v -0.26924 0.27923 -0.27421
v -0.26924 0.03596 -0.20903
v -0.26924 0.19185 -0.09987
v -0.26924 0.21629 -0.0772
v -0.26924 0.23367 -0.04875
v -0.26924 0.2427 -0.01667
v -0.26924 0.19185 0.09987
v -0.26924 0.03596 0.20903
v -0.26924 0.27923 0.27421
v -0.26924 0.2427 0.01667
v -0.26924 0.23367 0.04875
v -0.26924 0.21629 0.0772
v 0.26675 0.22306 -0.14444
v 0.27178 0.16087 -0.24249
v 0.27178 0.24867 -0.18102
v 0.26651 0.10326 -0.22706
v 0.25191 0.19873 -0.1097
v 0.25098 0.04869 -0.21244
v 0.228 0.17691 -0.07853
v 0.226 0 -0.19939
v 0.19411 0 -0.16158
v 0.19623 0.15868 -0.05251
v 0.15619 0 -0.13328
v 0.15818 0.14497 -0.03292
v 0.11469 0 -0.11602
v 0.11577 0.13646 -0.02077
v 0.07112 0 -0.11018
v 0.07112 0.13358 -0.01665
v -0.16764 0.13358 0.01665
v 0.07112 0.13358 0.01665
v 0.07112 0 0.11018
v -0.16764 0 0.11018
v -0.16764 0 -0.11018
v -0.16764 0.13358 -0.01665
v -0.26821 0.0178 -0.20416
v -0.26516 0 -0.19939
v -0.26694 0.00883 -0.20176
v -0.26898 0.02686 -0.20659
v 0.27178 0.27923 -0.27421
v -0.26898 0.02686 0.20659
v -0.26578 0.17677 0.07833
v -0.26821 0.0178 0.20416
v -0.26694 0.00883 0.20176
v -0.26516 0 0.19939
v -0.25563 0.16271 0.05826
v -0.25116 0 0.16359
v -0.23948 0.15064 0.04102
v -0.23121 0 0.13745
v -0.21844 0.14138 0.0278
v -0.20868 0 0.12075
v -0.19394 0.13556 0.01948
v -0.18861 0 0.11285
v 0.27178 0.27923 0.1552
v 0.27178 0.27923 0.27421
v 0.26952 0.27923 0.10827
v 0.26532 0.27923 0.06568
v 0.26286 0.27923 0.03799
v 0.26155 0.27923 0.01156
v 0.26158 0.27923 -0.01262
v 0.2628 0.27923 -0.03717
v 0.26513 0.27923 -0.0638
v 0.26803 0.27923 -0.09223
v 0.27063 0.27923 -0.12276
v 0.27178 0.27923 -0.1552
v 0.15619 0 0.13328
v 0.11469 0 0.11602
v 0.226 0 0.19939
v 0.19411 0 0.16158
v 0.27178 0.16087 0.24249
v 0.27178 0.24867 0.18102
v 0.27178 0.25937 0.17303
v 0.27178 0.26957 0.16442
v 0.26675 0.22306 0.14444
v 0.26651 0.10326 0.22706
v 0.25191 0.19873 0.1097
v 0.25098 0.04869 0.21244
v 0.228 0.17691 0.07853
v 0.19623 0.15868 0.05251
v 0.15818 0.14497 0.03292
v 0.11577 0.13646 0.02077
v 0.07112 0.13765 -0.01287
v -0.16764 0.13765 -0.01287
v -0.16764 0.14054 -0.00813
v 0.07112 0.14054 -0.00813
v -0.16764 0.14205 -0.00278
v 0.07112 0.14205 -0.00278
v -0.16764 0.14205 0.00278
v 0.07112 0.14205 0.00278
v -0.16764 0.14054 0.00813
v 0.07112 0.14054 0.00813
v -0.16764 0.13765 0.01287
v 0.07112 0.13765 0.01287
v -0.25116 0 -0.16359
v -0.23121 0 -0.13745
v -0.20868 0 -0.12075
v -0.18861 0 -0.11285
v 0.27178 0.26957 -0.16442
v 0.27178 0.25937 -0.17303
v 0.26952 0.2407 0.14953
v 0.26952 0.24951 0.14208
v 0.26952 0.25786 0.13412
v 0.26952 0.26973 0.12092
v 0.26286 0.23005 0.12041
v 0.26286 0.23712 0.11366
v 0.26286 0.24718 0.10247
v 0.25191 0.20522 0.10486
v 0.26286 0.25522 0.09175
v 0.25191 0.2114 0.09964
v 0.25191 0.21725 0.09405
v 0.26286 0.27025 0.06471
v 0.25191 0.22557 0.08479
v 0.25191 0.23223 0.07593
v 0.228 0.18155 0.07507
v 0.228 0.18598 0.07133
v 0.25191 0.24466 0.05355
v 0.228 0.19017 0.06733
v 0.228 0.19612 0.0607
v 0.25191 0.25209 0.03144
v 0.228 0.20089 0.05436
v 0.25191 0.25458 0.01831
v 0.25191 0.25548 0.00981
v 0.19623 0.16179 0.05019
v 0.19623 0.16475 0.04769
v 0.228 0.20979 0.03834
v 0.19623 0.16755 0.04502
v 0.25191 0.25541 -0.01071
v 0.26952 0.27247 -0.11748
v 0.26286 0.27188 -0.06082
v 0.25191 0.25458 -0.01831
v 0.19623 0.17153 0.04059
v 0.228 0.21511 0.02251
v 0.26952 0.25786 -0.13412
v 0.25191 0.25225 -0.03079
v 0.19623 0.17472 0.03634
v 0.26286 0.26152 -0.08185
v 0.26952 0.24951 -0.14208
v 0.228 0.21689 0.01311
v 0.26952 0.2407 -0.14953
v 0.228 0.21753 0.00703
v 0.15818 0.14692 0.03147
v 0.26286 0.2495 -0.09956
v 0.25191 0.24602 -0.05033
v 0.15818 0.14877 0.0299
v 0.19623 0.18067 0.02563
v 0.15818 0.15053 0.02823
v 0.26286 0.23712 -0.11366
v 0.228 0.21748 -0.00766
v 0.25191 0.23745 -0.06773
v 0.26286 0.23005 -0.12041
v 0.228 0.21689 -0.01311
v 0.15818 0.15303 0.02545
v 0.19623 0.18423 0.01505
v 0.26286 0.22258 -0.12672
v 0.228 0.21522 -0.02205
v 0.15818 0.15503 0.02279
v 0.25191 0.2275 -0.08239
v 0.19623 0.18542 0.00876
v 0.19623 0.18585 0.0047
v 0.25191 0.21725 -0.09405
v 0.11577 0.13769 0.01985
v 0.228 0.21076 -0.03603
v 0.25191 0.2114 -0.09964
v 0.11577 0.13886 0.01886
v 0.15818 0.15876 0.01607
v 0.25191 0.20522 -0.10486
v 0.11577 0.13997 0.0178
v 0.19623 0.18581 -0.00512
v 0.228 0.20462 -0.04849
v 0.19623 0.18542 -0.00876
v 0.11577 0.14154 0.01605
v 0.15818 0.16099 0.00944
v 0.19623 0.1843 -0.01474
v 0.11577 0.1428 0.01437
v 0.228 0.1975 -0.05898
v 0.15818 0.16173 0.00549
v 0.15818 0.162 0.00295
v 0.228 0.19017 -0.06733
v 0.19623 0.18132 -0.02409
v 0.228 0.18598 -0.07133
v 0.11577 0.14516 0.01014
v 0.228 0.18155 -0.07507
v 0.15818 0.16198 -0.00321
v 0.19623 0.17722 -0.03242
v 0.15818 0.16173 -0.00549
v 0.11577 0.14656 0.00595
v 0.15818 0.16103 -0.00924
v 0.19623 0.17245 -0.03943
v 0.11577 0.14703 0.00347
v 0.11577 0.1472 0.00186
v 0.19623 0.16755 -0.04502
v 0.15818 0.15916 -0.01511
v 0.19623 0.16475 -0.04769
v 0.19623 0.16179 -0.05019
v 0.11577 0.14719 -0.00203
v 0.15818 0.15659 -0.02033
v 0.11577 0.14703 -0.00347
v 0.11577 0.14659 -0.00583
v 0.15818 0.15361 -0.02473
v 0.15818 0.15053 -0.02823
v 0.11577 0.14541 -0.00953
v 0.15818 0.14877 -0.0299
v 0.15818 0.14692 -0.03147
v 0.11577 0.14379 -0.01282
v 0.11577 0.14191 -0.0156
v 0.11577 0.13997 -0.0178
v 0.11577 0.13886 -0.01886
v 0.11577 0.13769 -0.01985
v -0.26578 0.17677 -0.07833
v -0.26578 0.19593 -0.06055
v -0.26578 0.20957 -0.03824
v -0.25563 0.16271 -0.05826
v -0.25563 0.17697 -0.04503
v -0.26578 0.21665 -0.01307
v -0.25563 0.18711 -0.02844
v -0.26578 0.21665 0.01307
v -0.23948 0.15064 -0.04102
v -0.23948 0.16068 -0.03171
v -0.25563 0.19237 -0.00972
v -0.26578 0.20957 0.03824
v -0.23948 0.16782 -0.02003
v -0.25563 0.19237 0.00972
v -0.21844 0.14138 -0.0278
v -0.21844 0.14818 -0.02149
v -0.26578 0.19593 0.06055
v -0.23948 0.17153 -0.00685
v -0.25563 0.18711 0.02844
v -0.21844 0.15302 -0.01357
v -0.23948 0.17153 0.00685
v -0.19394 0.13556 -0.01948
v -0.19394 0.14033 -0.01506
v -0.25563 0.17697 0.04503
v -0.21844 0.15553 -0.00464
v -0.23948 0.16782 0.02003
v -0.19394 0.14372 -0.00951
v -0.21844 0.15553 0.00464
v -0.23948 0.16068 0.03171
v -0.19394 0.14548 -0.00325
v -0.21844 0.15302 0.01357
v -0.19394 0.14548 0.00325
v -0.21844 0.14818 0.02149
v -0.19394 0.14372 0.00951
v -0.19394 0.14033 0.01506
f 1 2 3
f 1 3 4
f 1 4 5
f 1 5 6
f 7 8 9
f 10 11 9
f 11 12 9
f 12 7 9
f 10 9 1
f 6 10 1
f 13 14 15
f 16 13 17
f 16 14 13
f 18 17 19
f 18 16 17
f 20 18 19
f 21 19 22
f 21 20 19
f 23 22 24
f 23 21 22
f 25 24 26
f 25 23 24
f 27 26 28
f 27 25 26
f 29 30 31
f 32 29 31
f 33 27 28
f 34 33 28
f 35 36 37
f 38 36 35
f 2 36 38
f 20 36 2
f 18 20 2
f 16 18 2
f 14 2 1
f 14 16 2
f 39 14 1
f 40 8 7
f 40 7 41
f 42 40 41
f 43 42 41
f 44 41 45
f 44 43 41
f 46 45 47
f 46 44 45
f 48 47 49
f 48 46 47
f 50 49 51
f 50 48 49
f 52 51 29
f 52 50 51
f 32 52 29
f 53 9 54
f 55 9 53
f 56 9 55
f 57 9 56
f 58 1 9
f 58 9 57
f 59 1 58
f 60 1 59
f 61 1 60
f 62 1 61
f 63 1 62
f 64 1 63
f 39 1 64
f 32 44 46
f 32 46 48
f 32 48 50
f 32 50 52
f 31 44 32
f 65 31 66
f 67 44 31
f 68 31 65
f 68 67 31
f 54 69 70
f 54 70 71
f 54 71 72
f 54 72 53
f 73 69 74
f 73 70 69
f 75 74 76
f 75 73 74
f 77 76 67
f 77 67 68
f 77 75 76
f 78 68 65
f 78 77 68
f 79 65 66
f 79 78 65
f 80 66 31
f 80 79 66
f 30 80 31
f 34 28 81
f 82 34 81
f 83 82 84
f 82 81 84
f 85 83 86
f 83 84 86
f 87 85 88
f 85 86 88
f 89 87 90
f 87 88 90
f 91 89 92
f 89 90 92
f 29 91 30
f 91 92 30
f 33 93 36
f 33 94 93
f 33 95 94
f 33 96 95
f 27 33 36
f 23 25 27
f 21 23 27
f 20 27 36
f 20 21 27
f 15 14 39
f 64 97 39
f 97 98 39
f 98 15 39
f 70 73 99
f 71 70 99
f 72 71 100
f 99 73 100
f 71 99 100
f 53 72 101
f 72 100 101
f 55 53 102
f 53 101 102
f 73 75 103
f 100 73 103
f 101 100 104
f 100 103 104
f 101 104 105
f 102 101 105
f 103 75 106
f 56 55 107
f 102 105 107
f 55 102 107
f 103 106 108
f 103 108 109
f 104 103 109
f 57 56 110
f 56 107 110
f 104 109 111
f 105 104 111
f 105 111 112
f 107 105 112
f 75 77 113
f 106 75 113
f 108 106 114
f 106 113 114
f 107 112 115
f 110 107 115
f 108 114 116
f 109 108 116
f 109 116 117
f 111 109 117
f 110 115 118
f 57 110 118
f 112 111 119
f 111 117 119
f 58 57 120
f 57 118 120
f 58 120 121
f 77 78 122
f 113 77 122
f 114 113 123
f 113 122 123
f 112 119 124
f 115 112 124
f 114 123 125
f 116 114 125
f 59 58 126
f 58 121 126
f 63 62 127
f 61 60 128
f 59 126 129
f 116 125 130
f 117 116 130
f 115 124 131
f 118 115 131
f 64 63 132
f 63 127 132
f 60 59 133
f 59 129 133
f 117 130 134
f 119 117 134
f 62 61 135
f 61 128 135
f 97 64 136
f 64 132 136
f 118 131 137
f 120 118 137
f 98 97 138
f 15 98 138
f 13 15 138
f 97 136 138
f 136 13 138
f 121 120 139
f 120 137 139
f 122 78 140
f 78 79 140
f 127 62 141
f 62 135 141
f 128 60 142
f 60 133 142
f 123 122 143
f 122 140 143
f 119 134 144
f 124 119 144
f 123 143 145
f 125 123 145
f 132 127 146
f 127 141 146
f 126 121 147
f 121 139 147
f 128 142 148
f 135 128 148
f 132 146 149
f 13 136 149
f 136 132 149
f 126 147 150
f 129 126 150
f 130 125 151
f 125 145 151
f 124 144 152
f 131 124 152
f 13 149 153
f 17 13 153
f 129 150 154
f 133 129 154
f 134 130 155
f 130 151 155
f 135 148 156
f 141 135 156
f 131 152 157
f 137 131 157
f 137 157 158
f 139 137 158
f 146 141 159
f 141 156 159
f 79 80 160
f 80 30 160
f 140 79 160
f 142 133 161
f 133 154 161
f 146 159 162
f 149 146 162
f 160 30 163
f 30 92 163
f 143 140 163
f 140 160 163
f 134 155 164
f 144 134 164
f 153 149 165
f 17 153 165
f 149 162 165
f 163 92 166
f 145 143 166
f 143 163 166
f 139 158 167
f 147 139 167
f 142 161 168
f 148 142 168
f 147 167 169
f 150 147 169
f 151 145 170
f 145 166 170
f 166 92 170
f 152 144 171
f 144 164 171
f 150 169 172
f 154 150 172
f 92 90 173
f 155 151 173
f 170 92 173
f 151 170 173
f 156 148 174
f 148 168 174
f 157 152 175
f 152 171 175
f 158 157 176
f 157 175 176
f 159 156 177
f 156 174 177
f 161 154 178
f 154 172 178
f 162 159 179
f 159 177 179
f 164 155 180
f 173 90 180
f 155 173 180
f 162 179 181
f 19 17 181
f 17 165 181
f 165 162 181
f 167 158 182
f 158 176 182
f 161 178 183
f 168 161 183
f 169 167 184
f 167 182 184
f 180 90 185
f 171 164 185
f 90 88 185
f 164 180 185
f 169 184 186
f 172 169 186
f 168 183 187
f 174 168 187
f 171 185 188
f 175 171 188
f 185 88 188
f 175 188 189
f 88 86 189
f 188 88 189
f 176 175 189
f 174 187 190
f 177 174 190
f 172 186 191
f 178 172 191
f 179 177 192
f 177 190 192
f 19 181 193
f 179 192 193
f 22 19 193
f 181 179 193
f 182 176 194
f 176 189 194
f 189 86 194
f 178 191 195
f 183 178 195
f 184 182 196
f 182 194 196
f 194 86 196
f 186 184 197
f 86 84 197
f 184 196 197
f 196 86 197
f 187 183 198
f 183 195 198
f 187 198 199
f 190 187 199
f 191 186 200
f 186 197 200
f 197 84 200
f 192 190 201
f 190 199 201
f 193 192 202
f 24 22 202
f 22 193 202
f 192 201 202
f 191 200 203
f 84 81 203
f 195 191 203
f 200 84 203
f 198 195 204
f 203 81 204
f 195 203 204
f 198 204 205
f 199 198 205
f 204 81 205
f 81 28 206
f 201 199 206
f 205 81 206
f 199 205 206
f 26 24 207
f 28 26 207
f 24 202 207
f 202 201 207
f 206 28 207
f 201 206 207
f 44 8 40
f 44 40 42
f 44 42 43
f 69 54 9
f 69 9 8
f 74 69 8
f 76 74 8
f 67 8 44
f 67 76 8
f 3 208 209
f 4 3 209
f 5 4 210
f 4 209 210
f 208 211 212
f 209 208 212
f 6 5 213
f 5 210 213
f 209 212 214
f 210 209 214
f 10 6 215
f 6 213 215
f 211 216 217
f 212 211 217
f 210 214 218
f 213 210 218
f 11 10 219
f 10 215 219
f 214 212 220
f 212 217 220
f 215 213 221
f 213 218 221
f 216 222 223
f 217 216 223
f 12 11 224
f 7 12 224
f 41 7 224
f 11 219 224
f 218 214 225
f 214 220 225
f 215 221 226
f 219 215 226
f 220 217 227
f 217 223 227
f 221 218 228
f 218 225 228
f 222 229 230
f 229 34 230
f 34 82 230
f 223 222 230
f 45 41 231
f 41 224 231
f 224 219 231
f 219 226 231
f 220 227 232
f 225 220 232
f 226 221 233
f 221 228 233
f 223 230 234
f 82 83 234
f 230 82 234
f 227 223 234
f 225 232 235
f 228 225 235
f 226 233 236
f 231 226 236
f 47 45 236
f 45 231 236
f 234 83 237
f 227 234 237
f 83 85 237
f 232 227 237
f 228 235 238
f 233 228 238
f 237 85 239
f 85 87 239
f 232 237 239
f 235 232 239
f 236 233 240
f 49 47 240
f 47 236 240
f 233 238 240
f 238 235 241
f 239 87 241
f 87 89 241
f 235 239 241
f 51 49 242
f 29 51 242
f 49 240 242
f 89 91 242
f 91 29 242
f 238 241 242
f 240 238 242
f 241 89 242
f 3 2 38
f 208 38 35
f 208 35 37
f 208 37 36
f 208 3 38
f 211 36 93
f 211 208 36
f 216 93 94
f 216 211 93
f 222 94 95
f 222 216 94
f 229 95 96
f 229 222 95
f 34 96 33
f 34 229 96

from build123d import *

# Parameters (mm, degrees)
SKETCH_TL_CUTTING_R    = 1.4986
TL_CUTTING_DEPTH       = 75.9968
SKETCH_TDF_CUTTING_W   = 3.01719996
SKETCH_TDF_CUTTING_H   = 3.01719996
TDF_CUTTING_DEPTH      = 77.026345527
VW_VR_GRINDING_DEPTH   = 1.4986
VW_VR_GRINDING_2_DEPTH = 1.4986
ISA_GRINDING_DEPTH     = 1.4986
SKETCH_PRE_FRX_BRX_W   = 1.21682002
SKETCH_PRE_FRX_BRX_H   = 0.83312
SKETCH_PRE_FRX_BRX_W_2 = 1.24935996
PRE_FRX_BRX_DEPTH      = 1.4986
FA_BA_GRINDING_DEPTH   = 1.4986
FR_EDM_R               = 0.1016
BR_EDM_R               = 0.20066
SKETCH_ENGRAVING_W     = 0.033186299
SKETCH_ENGRAVING_H     = 1.128593452
SKETCH_ENGRAVING_H_2   = 1.128593453
ENGRAVING_DEPTH        = 0.005


with BuildPart() as part:
    # sketch_TL_cutting → TL_cutting (new body)
    with BuildSketch(Plane(origin=(0, 0, 0), x_dir=(1, 0, 0), z_dir=(0, 1, 0))):
        with Locations(Location((0, 0, 0), (0, 0, 270))):
            Circle(SKETCH_TL_CUTTING_R)
    extrude(amount=TL_CUTTING_DEPTH)

    # sketch_TDF_cutting → TDF_cutting (cut, through all)
    with BuildSketch(Plane(origin=(0, 0, 0), x_dir=(1, 0, 0), z_dir=(0, 1, 0))):
        with Locations((-2.71001998, 0)):
            Rectangle(SKETCH_TDF_CUTTING_W, SKETCH_TDF_CUTTING_H)
    extrude(amount=TDF_CUTTING_DEPTH, mode=Mode.SUBTRACT)


with BuildPart() as body_2:
    # sketch_VW_VR_grinding → VW_VR_grinding (new, symmetric)
    with BuildSketch(Plane(origin=(0, 0, 0), x_dir=(0, 0, -1), z_dir=(1, 0, 0))):
        with BuildLine():
            Line((-1.49360001, -0.00999998), (-1.49360001, 0.822008914))
            ThreePointArc((-1.49360001, 0.822008914), (-1.493648337, 0.823115792), (-1.493792952, 0.824214246))
            Line((-1.493792952, 0.824214246), (-1.51859996, 0.964901782))
            Line((-1.51859996, 0.964901782), (-1.50859998, -0.00999998))
            Line((-1.50859998, -0.00999998), (-1.49360001, -0.00999998))
        make_face()
    extrude(amount=VW_VR_GRINDING_DEPTH, both=True)


with BuildPart() as body_3:
    # sketch_VW_VR_grinding → VW_VR_grinding 2 (new, symmetric)
    with BuildSketch(Plane(origin=(0, 0, 0), x_dir=(0, 0, -1), z_dir=(1, 0, 0))):
        with BuildLine():
            Line((1.49360001, -0.00999998), (1.49360001, 0.822008914))
            ThreePointArc((1.49360001, 0.822008914), (1.493648337, 0.823115792), (1.493792952, 0.824214246))
            Line((1.493792952, 0.824214246), (1.51859996, 0.964901782))
            Line((1.51859996, 0.964901782), (1.50859998, -0.00999998))
            Line((1.50859998, -0.00999998), (1.49360001, -0.00999998))
        make_face()
    extrude(amount=VW_VR_GRINDING_2_DEPTH, both=True)


    add(body_2.part)  # ISA_grinding merges body 2
    # sketch_ISA_grinding → ISA_grinding (add, symmetric)
    with BuildSketch(Plane(origin=(0, 0, 0), x_dir=(0, 0, -1), z_dir=(1, 0, 0))):
        Polygon((-0.19939, 0), (0.19939, 0), (1.50859998, 4.886038163), (1.50859998, -0.02999994), (-1.50859998, -0.02999994), (-1.50859998, 4.886038163), align=None)
    extrude(amount=ISA_GRINDING_DEPTH, both=True)

    # sketch_pre_FRX_BRX → pre_FRX_BRX (add, symmetric)
    with BuildSketch(Plane.XY):
        with Locations((0.89018999, 0.40656002)):
            Rectangle(SKETCH_PRE_FRX_BRX_W, SKETCH_PRE_FRX_BRX_H)
        with Locations((-0.89391998, 0.40656002)):
            Rectangle(SKETCH_PRE_FRX_BRX_W_2, SKETCH_PRE_FRX_BRX_H)
    extrude(amount=PRE_FRX_BRX_DEPTH, both=True)

    # sketch_FA_BA_grinding → FA_BA_grinding (add, symmetric)
    with BuildSketch(Plane.XY):
        Polygon((0.27178, -0.00999998), (0.27178, 0.83312), (1.6256, 10.466049838), (1.6256, -0.00999998), align=None)
        Polygon((-0.26924, -0.00999998), (-0.26924, 0.83312), (-1.32842, 8.369577303), (-1.32842, -0.00999998), align=None)
    extrude(amount=FA_BA_GRINDING_DEPTH, both=True)


with BuildPart() as part_1:
    add(part.part)

    # B1_fix: cut body 3
    add(body_3.part, mode=Mode.SUBTRACT)

    # V-Groove_EDM: sweep along a path in sketch_contour_V-Groove
    with BuildLine(Plane.XY) as v_groove_edm_path:
        Line((-1.20142, 0.14224), (1.4986, 0.14224))
    # sketch_section_V-Groove → V-Groove_EDM (sweep, cut)
    with BuildSketch(Plane(origin=(-1.20142, 0, -1.2954), x_dir=(0, 0, -1), z_dir=(1, 0, 0))):
        with BuildLine():
            Line((-1.27875483, 0.133575073), (-1.178222496, -0.00999998))
            Line((-1.178222496, -0.00999998), (-1.412577504, -0.00999998))
            Line((-1.412577504, -0.00999998), (-1.31204517, 0.133575073))
            ThreePointArc((-1.31204517, 0.133575073), (-1.2954, 0.14224), (-1.27875483, 0.133575073))
        make_face()
    sweep(path=v_groove_edm_path.line, mode=Mode.SUBTRACT)

    # FR_EDM
    fr_edm_edges = [part_1.edges().sort_by_distance(p)[0] for p in [
        (-0.26924, 0.14224, 0),
        (-0.26924, 0.066787537, -0.063410306),
        (-0.26924, 0.066787537, 0.063410306),
    ]]
    fillet(fr_edm_edges, radius=FR_EDM_R)

    # BR_EDM
    br_edm_edges = [part_1.edges().sort_by_distance(p)[0] for p in [
        (0.27178, 0.066787537, 0.063410306),
        (0.27178, 0.14224, 0),
        (0.27178, 0.066787537, -0.063410306),
    ]]
    fillet(br_edm_edges, radius=BR_EDM_R)

    # sketch_Engraving → Engraving (cut)
    # profile 1 of 14: a face of its own
    with BuildSketch(Plane.ZY.offset(1.20142)):
        Polygon((0.531688452, 45.269846756), (0.531688452, 44.551415224), (0.030264207, 44.92787231), (0.030264207, 44.765052028), (-0.034552784, 44.633862437), (-0.102740259, 44.56723057), (-0.296154161, 44.503450651), (-0.425528876, 44.503450651), (-0.618942778, 44.56723057), (-0.749354564, 44.69842016), (-0.81235668, 44.891834063), (-0.81235668, 45.083433089), (-0.749354564, 45.276846991), (-0.682722697, 45.345293734), (-0.555940662, 45.408295849), (-0.541940192, 45.382887589), (-0.665351744, 45.320663277), (-0.724724108, 45.262846521), (-0.785133544, 45.080062605), (-0.785133544, 44.895463814), (-0.724724108, 44.712420631), (-0.604164504, 44.592638831), (-0.42112132, 44.531451591), (-0.299524645, 44.531451591), (-0.116740729, 44.592638831), (-0.059701777, 44.652270463), (0.001485463, 44.772052263), (0.001485463, 44.985429798), (0.502909708, 44.60923198), (0.502909708, 45.269846756), align=None)
    # profile 2 of 14: a face of its own
    with BuildSketch(Plane.ZY.offset(1.20142)):
        Polygon((-0.79576353, 43.729743189), (-0.79576353, 43.758521933), (0.483723879, 43.758521933), (0.316755309, 43.923157091), (0.254530997, 44.049939126), (0.278902186, 44.064976668), (0.341904302, 43.940528044), (0.531688452, 43.74996609), (0.531688452, 43.729743189), align=None)
    # profile 3 of 14: a face of its own
    with BuildSketch(Plane.ZY.offset(1.20142)):
        Polygon((-0.79576353, 42.579837909), (-0.79576353, 42.608616653), (0.483723879, 42.608616653), (0.316755309, 42.773251811), (0.254530997, 42.900033846), (0.278902186, 42.915071388), (0.341904302, 42.790622765), (0.531688452, 42.60006081), (0.531688452, 42.579837909), align=None)
    # profile 4 of 14: a face of its own
    with BuildSketch(Plane.ZY.offset(1.20142)):
        Polygon((-0.786170615, 41.055549687), (-0.79576353, 41.079920876), (-0.367193584, 41.245333838), (-0.367193584, 41.893763019), (-0.79576353, 42.059175981), (-0.786170615, 42.08354717), (0.531688452, 41.578752441), (0.531688452, 41.559566612), align=None)
        Polygon((-0.340748251, 41.255704557), (0.478538519, 41.569159527), (-0.340748251, 41.883133033), align=None, mode=Mode.SUBTRACT)
    # profile 5 of 14: a face of its own
    with BuildSketch(Plane.ZY.offset(1.20142)):
        with Locations((-0.231596438, 40.285083075)):
            Rectangle(SKETCH_ENGRAVING_W, SKETCH_ENGRAVING_H)
    # profile 6 of 14: a face of its own
    with BuildSketch(Plane.ZY.offset(1.20142)):
        Polygon((0.515095302, 38.490248732), (-0.79576353, 38.988821029), (-0.79576353, 39.018636845), (0.521058466, 39.518246214), (0.531688452, 39.493875025), (-0.756354799, 39.003858571), (0.525466021, 38.514619921), align=None)
    # profile 7 of 14: a face of its own
    with BuildSketch(Plane.ZY.offset(1.20142)):
        Polygon((-0.786170615, 38.108295165), (0.502909708, 37.49227448), (0.502909708, 38.347080961), (0.531688452, 38.347080961), (0.531688452, 37.44508771), (-0.79576353, 38.083664709), align=None)
    # profile 8 of 14: a face of its own
    with BuildSketch(Plane.ZY.offset(1.20142)):
        Polygon((-0.554125786, 36.366740389), (-0.749354564, 36.498189247), (-0.81235668, 36.693158757), (-0.81235668, 36.82279274), (-0.749354564, 37.01776225), (-0.554125786, 37.148174036), (-0.237559601, 37.211176152), (-0.044923503, 37.211176152), (0.271901951, 37.148174036), (0.466871461, 37.01776225), (0.531688452, 36.82279274), (0.531688452, 36.693158757), (0.466871461, 36.498189247), (0.271901951, 36.366740389), (-0.044923503, 36.304775345), (-0.237559601, 36.304775345), align=None)
        Polygon((-0.539347512, 36.395778401), (-0.22874449, 36.332776285), (-0.044923503, 36.332776285), (0.26567952, 36.395778401), (0.446907827, 36.515560201), (0.507057995, 36.696788509), (0.507057995, 36.818385184), (0.446907827, 36.999613492), (0.26567952, 37.120173096), (-0.044923503, 37.182397408), (-0.22874449, 37.182397408), (-0.539347512, 37.120173096), (-0.72057582, 36.999613492), (-0.780985256, 36.818385184), (-0.780985256, 36.696788509), (-0.72057582, 36.515560201), align=None, mode=Mode.SUBTRACT)
    # profile 9 of 14: a face of its own
    with BuildSketch(Plane.ZY.offset(1.20142)):
        with Locations((-0.231596438, 35.419971561)):
            Rectangle(SKETCH_ENGRAVING_W, SKETCH_ENGRAVING_H_2)
    # profile 10 of 14: a face of its own
    with BuildSketch(Plane.ZY.offset(1.20142)):
        Polygon((-0.541940192, 34.502759279), (-0.665351744, 34.440534968), (-0.724724108, 34.382718211), (-0.785133544, 34.199934296), (-0.785133544, 34.015335505), (-0.724724108, 33.832292321), (-0.604164504, 33.712510521), (-0.42112132, 33.651323281), (-0.299524645, 33.651323281), (-0.116740729, 33.712510521), (0.003041071, 33.832292321), (0.064487579, 34.015335505), (0.064487579, 34.199934296), (0.003041071, 34.382718211), (-0.086924913, 34.470350784), (0.531688452, 34.402941113), (0.531688452, 33.762289971), (0.502909708, 33.762289971), (0.502909708, 34.377532852), (-0.007329648, 34.434312537), (0.028449332, 34.396718682), (0.092488519, 34.203304779), (0.092488519, 34.011705753), (0.028449332, 33.818291851), (-0.102740259, 33.687102261), (-0.296154161, 33.623322341), (-0.425528876, 33.623322341), (-0.618942778, 33.687102261), (-0.749354564, 33.818291851), (-0.81235668, 34.011705753), (-0.81235668, 34.203304779), (-0.749354564, 34.396718682), (-0.682722697, 34.465165424), (-0.555940662, 34.52816754), align=None)
    # profile 11 of 14: a face of its own
    with BuildSketch(Plane.ZY.offset(1.20142)):
        Polygon((-0.554125786, 32.535382105), (-0.749354564, 32.666830964), (-0.81235668, 32.861800473), (-0.81235668, 32.991434456), (-0.749354564, 33.186403966), (-0.554125786, 33.316815753), (-0.237559601, 33.379817868), (-0.044923503, 33.379817868), (0.271901951, 33.316815753), (0.466871461, 33.186403966), (0.531688452, 32.991434456), (0.531688452, 32.861800473), (0.466871461, 32.666830964), (0.271901951, 32.535382105), (-0.044923503, 32.473417061), (-0.237559601, 32.473417061), align=None)
        Polygon((-0.539347512, 32.564420117), (-0.22874449, 32.501418002), (-0.044923503, 32.501418002), (0.26567952, 32.564420117), (0.446907827, 32.684201917), (0.507057995, 32.865430225), (0.507057995, 32.987026901), (0.446907827, 33.168255208), (0.26567952, 33.288814812), (-0.044923503, 33.351039124), (-0.22874449, 33.351039124), (-0.539347512, 33.288814812), (-0.72057582, 33.168255208), (-0.780985256, 32.987026901), (-0.780985256, 32.865430225), (-0.72057582, 32.684201917), align=None, mode=Mode.SUBTRACT)
    # profile 12 of 14: a face of its own
    with BuildSketch(Plane.ZY.offset(1.20142)):
        Polygon((-0.554125786, 31.385476826), (-0.749354564, 31.516925684), (-0.81235668, 31.711895194), (-0.81235668, 31.841529177), (-0.749354564, 32.036498686), (-0.554125786, 32.166910473), (-0.237559601, 32.229912589), (-0.044923503, 32.229912589), (0.271901951, 32.166910473), (0.466871461, 32.036498686), (0.531688452, 31.841529177), (0.531688452, 31.711895194), (0.466871461, 31.516925684), (0.271901951, 31.385476826), (-0.044923503, 31.323511782), (-0.237559601, 31.323511782), align=None)
        Polygon((-0.539347512, 31.414514838), (-0.22874449, 31.351512722), (-0.044923503, 31.351512722), (0.26567952, 31.414514838), (0.446907827, 31.534296638), (0.507057995, 31.715524945), (0.507057995, 31.837121621), (0.446907827, 32.018349929), (0.26567952, 32.138909533), (-0.044923503, 32.201133844), (-0.22874449, 32.201133844), (-0.539347512, 32.138909533), (-0.72057582, 32.018349929), (-0.780985256, 31.837121621), (-0.780985256, 31.715524945), (-0.72057582, 31.534296638), align=None, mode=Mode.SUBTRACT)
    # profile 13 of 14: a face of its own
    with BuildSketch(Plane.ZY.offset(1.20142)):
        with Locations((-0.231596438, 30.438707997)):
            Rectangle(SKETCH_ENGRAVING_W, SKETCH_ENGRAVING_H_2)
    # profile 14 of 14: a face of its own
    with BuildSketch(Plane.ZY.offset(1.20142)):
        Polygon((-0.79576353, 29.018256595), (-0.79576353, 29.04703534), (0.483723879, 29.04703534), (0.316755309, 29.211670497), (0.254530997, 29.338452532), (0.278902186, 29.353490074), (0.341904302, 29.229041451), (0.531688452, 29.038479497), (0.531688452, 29.018256595), align=None)
    extrude(amount=-ENGRAVING_DEPTH, mode=Mode.SUBTRACT)

    # SurfaceCut1
    split(bisect_by=Plane(origin=(0, 0.279226503, 0), x_dir=(1, 0, 0), z_dir=(0, 1, 0)), keep=Keep.BOTTOM)


solid = part_1.part
